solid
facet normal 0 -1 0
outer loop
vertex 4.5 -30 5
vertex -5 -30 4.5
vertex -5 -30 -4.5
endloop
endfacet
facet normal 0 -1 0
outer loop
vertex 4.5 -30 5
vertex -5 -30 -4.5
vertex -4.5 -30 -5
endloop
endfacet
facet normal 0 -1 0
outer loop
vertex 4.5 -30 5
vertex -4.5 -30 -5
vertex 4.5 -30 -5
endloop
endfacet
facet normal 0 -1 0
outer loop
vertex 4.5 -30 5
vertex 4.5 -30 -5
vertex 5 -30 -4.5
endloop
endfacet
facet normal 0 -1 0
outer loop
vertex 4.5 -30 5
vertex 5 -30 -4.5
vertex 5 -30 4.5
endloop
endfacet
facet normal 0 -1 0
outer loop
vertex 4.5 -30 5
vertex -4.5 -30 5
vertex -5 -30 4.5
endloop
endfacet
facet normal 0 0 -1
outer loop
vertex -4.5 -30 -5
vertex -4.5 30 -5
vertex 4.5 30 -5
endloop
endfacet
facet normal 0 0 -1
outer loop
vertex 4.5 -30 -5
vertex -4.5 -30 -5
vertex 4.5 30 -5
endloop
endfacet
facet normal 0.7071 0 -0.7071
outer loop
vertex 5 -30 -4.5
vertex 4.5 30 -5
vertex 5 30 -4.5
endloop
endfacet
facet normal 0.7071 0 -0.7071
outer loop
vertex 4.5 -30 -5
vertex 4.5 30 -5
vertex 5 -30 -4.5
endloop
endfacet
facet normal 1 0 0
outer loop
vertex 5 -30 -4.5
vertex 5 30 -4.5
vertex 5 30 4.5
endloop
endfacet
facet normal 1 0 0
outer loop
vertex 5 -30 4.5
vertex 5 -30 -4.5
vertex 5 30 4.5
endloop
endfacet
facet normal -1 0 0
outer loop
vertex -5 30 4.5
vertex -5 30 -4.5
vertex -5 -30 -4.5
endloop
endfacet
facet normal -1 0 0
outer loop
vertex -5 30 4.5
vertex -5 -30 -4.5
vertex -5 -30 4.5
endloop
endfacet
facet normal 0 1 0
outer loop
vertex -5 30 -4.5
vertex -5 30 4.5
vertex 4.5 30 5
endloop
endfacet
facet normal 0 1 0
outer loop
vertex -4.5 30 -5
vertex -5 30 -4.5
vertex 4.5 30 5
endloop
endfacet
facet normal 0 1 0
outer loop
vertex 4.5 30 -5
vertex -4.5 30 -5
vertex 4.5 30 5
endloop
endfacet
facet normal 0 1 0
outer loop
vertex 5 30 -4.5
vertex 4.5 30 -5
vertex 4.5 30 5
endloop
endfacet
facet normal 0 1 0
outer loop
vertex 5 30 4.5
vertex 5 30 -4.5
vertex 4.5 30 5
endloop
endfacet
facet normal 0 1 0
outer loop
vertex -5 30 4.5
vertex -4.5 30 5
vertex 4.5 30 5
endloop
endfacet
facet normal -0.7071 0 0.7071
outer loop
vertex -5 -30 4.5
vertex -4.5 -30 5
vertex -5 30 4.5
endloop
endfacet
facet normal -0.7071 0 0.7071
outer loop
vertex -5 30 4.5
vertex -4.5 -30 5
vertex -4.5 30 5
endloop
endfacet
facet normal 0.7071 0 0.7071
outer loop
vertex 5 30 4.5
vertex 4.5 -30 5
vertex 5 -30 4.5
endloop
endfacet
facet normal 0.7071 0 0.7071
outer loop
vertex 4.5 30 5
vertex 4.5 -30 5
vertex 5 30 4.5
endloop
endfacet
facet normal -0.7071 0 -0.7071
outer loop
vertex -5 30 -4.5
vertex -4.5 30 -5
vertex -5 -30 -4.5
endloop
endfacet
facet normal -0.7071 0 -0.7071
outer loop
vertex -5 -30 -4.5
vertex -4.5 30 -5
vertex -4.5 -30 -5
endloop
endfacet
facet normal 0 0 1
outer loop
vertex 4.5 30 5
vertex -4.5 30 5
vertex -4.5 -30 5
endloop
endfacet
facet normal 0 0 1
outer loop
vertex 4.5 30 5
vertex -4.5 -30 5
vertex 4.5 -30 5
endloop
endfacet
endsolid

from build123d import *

# Parameters (mm, degrees)
F0_W     = 10
F0_H     = 10
F1_DEPTH = 30
F2_SIZE  = 0.5


with BuildPart() as f1:
    # F0 (on Front) → F1 (new body, symmetric)
    with BuildSketch(Plane.XZ):
        Rectangle(F0_W, F0_H)
    extrude(amount=F1_DEPTH, both=True)

    # F2
    f2_edges = [f1.edges().sort_by_distance(p)[0] for p in [
        (5, 0, 5),
        (5, 0, -5),
        (-5, 0, 5),
        (-5, 0, -5),
    ]]
    chamfer(f2_edges, length=F2_SIZE)


solid = f1.part
